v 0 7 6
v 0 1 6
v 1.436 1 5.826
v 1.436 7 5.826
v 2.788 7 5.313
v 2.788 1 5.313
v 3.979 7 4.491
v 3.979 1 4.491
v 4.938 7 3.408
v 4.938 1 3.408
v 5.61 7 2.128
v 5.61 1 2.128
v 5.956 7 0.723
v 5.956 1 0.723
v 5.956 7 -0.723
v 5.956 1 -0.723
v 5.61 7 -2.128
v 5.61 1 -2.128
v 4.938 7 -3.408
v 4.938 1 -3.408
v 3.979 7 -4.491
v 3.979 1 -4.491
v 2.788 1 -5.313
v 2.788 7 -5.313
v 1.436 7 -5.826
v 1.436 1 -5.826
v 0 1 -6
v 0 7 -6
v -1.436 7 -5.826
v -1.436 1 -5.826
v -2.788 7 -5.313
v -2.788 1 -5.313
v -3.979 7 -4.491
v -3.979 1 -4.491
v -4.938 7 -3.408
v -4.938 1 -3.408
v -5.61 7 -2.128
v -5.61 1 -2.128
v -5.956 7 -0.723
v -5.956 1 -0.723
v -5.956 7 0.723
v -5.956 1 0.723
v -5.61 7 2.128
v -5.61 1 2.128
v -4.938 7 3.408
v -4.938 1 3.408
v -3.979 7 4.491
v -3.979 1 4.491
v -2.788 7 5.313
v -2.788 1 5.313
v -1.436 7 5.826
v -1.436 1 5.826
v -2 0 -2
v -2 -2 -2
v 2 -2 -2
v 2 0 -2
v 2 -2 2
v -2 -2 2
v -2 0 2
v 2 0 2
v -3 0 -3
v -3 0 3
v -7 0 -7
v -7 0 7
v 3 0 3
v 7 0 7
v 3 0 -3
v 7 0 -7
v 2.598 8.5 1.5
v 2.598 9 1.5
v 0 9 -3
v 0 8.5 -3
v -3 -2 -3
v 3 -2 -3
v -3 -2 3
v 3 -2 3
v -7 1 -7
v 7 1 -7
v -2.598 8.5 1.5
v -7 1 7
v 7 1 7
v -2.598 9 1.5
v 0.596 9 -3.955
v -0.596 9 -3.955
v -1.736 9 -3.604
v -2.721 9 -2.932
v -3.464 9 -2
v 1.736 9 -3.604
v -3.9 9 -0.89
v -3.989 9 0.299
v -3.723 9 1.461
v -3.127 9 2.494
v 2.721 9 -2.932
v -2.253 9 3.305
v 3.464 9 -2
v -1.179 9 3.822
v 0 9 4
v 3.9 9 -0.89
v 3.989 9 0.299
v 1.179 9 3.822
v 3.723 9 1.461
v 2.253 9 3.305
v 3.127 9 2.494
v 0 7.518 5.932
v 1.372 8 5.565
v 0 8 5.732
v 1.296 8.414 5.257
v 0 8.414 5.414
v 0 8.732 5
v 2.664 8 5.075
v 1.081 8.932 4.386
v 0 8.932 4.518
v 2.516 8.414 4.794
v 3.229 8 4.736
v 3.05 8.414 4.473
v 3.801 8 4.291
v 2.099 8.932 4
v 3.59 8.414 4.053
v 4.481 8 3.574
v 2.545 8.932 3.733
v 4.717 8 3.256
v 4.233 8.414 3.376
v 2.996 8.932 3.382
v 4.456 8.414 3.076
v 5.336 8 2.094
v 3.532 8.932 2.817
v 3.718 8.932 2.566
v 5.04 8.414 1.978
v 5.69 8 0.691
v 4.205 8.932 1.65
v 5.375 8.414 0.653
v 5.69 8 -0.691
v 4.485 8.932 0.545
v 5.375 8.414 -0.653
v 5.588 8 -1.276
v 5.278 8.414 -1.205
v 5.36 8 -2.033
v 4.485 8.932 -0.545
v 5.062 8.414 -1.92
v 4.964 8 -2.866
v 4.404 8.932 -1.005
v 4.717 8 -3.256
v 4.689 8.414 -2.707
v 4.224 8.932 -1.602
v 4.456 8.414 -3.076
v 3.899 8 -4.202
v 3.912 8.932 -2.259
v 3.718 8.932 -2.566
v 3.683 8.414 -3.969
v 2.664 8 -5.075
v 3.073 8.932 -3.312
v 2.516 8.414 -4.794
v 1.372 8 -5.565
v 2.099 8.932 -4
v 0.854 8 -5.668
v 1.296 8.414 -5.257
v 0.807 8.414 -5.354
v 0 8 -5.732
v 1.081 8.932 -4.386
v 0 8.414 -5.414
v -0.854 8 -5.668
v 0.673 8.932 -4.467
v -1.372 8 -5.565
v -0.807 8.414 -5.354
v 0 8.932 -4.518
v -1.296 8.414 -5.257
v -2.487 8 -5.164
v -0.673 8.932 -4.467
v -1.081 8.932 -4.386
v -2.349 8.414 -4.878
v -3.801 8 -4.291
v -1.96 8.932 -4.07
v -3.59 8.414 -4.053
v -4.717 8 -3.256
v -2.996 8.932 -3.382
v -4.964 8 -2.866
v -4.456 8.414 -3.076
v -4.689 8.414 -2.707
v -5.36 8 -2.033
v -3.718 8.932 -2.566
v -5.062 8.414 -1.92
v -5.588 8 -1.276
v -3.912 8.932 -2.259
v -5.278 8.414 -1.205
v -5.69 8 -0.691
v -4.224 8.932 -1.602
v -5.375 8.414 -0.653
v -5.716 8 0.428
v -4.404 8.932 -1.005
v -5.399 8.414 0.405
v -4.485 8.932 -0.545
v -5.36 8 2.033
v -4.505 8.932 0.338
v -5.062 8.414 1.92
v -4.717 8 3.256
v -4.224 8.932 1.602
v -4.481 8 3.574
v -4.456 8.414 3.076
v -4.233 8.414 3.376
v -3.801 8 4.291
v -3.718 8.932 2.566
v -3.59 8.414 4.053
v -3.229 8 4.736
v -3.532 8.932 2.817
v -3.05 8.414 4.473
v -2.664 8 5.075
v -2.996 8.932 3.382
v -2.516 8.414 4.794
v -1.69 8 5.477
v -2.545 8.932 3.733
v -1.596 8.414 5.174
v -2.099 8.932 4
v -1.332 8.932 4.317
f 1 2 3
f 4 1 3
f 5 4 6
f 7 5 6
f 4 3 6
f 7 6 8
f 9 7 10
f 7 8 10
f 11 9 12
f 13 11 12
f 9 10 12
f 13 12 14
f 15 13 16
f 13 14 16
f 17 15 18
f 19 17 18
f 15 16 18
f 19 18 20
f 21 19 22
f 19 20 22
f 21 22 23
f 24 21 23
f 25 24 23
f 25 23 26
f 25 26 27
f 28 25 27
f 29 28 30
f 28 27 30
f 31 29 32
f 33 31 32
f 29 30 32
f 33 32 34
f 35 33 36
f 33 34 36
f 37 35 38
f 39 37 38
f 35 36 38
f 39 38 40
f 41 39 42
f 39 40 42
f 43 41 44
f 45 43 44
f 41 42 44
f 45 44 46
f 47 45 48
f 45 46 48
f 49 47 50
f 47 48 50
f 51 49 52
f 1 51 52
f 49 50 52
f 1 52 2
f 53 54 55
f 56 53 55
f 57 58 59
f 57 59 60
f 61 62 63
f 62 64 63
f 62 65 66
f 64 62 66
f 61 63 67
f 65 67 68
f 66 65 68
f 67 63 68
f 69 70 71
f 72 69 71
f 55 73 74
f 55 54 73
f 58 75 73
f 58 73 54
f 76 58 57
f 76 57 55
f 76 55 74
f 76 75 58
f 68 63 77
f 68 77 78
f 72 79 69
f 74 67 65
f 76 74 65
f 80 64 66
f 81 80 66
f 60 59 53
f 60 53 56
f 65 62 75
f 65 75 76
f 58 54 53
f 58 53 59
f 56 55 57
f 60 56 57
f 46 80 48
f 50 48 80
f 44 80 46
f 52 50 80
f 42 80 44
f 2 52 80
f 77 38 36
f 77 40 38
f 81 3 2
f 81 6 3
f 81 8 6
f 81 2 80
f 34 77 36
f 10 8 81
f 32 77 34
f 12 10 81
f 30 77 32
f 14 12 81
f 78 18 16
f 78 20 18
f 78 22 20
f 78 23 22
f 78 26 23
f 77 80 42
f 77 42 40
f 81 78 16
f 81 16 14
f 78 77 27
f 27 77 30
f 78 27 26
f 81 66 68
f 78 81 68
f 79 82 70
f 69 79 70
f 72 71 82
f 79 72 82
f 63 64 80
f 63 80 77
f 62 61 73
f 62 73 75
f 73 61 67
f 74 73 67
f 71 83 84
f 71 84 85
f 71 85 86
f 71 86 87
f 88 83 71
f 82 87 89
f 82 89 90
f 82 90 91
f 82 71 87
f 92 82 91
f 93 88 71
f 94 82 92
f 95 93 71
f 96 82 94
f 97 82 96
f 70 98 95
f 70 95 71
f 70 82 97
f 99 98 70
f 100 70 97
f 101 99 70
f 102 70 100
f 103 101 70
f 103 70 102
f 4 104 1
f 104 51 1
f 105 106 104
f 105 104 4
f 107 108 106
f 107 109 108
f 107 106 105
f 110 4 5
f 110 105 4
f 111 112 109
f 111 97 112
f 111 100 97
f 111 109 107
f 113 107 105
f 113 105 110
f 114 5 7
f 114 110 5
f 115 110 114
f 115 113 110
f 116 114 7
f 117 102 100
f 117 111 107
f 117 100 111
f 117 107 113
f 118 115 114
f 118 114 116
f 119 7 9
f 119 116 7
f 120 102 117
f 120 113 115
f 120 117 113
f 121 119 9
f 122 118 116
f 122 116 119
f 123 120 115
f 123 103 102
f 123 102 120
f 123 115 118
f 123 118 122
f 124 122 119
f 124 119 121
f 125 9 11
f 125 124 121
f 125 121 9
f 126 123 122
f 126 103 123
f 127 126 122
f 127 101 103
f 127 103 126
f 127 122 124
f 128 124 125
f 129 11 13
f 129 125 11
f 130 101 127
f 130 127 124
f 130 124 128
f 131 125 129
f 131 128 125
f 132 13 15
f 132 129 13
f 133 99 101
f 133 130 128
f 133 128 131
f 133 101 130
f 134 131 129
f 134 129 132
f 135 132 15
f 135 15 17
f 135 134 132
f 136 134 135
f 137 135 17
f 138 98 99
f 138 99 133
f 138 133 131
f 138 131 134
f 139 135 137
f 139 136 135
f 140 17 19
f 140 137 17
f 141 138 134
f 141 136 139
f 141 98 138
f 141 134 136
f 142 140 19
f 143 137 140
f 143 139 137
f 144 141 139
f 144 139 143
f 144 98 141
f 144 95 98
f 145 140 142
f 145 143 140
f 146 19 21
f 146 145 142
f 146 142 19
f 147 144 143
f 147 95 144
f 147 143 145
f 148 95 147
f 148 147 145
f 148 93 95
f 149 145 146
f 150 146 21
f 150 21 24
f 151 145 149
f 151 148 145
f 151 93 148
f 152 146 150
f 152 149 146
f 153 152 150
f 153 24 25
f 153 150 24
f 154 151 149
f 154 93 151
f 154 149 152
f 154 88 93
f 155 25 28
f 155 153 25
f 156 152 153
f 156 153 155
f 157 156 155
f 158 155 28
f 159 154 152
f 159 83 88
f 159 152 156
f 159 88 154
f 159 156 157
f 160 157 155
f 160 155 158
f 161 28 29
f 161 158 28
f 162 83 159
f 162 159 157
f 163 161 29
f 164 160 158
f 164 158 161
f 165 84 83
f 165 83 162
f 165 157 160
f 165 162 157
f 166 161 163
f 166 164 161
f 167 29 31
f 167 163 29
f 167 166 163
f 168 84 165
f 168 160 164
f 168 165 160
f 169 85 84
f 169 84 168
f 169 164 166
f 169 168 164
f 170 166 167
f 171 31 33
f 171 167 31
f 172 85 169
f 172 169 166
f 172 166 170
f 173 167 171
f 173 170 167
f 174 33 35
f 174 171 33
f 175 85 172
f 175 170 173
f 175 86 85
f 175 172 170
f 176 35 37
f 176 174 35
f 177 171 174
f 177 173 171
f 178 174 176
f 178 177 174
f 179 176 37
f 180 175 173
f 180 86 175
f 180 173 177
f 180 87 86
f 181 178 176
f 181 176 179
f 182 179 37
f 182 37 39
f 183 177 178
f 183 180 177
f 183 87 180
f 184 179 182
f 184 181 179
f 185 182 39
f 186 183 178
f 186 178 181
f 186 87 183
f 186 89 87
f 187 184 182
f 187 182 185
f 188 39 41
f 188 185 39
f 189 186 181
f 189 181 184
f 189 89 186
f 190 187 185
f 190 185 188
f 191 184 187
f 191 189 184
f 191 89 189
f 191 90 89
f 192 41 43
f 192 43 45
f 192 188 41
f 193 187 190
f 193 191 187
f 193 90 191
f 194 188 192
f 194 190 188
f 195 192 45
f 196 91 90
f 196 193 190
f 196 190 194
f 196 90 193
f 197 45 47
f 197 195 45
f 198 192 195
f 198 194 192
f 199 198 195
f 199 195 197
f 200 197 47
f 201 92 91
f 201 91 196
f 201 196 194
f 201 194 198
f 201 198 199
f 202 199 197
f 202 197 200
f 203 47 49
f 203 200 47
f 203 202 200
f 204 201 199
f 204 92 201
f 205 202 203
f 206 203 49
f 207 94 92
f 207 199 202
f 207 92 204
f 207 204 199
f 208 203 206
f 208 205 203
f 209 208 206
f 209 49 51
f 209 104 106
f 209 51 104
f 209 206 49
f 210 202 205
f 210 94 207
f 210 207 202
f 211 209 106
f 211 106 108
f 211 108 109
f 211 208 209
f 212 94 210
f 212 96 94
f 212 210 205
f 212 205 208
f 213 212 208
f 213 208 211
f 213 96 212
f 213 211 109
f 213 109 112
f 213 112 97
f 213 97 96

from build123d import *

# Parameters (mm, degrees)
CROQUIS1_W              = 14
CROQUIS1_H              = 14
SALIENTE_EXTRUIR1_DEPTH = 1
CROQUIS2_W              = 4
CROQUIS2_H              = 4
CORTAR_EXTRUIR1_DEPTH   = 1
CROQUIS3_W              = 6
CROQUIS3_H              = 6
SALIENTE_EXTRUIR3_DEPTH = 1
CROQUIS5_W              = 4
CROQUIS5_H              = 4
CORTAR_EXTRUIR3_DEPTH   = 1
CROQUIS6_R              = 6
SALIENTE_EXTRUIR4_DEPTH = 8
CROQUIS7_W              = 6
CROQUIS7_H              = 6
CORTAR_EXTRUIR4_DEPTH   = 2
CROQUIS8_W              = 14
CROQUIS8_H              = 14
SALIENTE_EXTRUIR5_DEPTH = 1
CROQUIS9_W              = 6
CROQUIS9_H              = 6
SALIENTE_EXTRUIR6_DEPTH = 2
CROQUIS10_W             = 4
CROQUIS10_H             = 4
CORTAR_EXTRUIR5_DEPTH   = 2
REDONDEO2_R             = 2
CORTAR_EXTRUIR6_DEPTH   = 0.5


with BuildPart() as part:
    # Croquis1 → Saliente-Extruir1 (new body)
    with BuildSketch(Plane(origin=(0, 0, 0), x_dir=(1, 0, 0), z_dir=(0, 1, 0))):
        Rectangle(CROQUIS1_W, CROQUIS1_H)
    extrude(amount=SALIENTE_EXTRUIR1_DEPTH)

    # Croquis2 → Cortar-Extruir1 (cut)
    with BuildSketch(Plane.XZ):
        Rectangle(CROQUIS2_W, CROQUIS2_H)
    extrude(amount=-CORTAR_EXTRUIR1_DEPTH, mode=Mode.SUBTRACT)

    # Croquis3 → Saliente-Extruir3 (add)
    with BuildSketch(Plane.XZ):
        Rectangle(CROQUIS3_W, CROQUIS3_H)
    extrude(amount=SALIENTE_EXTRUIR3_DEPTH)

    # Croquis5 → Cortar-Extruir3 (cut)
    with BuildSketch(Plane.XZ.offset(1)):
        Rectangle(CROQUIS5_W, CROQUIS5_H)
    extrude(amount=-CORTAR_EXTRUIR3_DEPTH, mode=Mode.SUBTRACT)

    # Croquis6 → Saliente-Extruir4 (add)
    with BuildSketch(Plane(origin=(0, 1, 0), x_dir=(1, 0, 0), z_dir=(0, 1, 0))):
        with Locations(Location((0, 0, 0), (0, 0, 270))):
            Circle(CROQUIS6_R)
    extrude(amount=SALIENTE_EXTRUIR4_DEPTH)

    # Croquis7 → Cortar-Extruir4 (cut)
    with BuildSketch(Plane.XZ.offset(1)):
        Rectangle(CROQUIS7_W, CROQUIS7_H)
    extrude(amount=-CORTAR_EXTRUIR4_DEPTH, mode=Mode.SUBTRACT)

    # Croquis8 → Saliente-Extruir5 (add)
    with BuildSketch(Plane.XZ):
        Rectangle(CROQUIS8_W, CROQUIS8_H)
    extrude(amount=-SALIENTE_EXTRUIR5_DEPTH)

    # Croquis9 → Saliente-Extruir6 (add)
    with BuildSketch(Plane.XZ):
        Rectangle(CROQUIS9_W, CROQUIS9_H)
    extrude(amount=SALIENTE_EXTRUIR6_DEPTH)

    # Croquis10 → Cortar-Extruir5 (cut)
    with BuildSketch(Plane.XZ.offset(2)):
        Rectangle(CROQUIS10_W, CROQUIS10_H)
    extrude(amount=-CORTAR_EXTRUIR5_DEPTH, mode=Mode.SUBTRACT)

    # Redondeo2
    redondeo2_edges = [part.edges().sort_by_distance(p)[0] for p in [
        (0, 9, -6),
    ]]
    fillet(redondeo2_edges, radius=REDONDEO2_R)

    # Croquis11 → Cortar-Extruir6 (cut)
    with BuildSketch(Plane(origin=(0, 9, 0), x_dir=(1, 0, 0), z_dir=(0, 1, 0))):
        Polygon((0, 3), (-2.598076211, -1.5), (2.598076211, -1.5), align=None)
    extrude(amount=-CORTAR_EXTRUIR6_DEPTH, mode=Mode.SUBTRACT)


solid = part.part
